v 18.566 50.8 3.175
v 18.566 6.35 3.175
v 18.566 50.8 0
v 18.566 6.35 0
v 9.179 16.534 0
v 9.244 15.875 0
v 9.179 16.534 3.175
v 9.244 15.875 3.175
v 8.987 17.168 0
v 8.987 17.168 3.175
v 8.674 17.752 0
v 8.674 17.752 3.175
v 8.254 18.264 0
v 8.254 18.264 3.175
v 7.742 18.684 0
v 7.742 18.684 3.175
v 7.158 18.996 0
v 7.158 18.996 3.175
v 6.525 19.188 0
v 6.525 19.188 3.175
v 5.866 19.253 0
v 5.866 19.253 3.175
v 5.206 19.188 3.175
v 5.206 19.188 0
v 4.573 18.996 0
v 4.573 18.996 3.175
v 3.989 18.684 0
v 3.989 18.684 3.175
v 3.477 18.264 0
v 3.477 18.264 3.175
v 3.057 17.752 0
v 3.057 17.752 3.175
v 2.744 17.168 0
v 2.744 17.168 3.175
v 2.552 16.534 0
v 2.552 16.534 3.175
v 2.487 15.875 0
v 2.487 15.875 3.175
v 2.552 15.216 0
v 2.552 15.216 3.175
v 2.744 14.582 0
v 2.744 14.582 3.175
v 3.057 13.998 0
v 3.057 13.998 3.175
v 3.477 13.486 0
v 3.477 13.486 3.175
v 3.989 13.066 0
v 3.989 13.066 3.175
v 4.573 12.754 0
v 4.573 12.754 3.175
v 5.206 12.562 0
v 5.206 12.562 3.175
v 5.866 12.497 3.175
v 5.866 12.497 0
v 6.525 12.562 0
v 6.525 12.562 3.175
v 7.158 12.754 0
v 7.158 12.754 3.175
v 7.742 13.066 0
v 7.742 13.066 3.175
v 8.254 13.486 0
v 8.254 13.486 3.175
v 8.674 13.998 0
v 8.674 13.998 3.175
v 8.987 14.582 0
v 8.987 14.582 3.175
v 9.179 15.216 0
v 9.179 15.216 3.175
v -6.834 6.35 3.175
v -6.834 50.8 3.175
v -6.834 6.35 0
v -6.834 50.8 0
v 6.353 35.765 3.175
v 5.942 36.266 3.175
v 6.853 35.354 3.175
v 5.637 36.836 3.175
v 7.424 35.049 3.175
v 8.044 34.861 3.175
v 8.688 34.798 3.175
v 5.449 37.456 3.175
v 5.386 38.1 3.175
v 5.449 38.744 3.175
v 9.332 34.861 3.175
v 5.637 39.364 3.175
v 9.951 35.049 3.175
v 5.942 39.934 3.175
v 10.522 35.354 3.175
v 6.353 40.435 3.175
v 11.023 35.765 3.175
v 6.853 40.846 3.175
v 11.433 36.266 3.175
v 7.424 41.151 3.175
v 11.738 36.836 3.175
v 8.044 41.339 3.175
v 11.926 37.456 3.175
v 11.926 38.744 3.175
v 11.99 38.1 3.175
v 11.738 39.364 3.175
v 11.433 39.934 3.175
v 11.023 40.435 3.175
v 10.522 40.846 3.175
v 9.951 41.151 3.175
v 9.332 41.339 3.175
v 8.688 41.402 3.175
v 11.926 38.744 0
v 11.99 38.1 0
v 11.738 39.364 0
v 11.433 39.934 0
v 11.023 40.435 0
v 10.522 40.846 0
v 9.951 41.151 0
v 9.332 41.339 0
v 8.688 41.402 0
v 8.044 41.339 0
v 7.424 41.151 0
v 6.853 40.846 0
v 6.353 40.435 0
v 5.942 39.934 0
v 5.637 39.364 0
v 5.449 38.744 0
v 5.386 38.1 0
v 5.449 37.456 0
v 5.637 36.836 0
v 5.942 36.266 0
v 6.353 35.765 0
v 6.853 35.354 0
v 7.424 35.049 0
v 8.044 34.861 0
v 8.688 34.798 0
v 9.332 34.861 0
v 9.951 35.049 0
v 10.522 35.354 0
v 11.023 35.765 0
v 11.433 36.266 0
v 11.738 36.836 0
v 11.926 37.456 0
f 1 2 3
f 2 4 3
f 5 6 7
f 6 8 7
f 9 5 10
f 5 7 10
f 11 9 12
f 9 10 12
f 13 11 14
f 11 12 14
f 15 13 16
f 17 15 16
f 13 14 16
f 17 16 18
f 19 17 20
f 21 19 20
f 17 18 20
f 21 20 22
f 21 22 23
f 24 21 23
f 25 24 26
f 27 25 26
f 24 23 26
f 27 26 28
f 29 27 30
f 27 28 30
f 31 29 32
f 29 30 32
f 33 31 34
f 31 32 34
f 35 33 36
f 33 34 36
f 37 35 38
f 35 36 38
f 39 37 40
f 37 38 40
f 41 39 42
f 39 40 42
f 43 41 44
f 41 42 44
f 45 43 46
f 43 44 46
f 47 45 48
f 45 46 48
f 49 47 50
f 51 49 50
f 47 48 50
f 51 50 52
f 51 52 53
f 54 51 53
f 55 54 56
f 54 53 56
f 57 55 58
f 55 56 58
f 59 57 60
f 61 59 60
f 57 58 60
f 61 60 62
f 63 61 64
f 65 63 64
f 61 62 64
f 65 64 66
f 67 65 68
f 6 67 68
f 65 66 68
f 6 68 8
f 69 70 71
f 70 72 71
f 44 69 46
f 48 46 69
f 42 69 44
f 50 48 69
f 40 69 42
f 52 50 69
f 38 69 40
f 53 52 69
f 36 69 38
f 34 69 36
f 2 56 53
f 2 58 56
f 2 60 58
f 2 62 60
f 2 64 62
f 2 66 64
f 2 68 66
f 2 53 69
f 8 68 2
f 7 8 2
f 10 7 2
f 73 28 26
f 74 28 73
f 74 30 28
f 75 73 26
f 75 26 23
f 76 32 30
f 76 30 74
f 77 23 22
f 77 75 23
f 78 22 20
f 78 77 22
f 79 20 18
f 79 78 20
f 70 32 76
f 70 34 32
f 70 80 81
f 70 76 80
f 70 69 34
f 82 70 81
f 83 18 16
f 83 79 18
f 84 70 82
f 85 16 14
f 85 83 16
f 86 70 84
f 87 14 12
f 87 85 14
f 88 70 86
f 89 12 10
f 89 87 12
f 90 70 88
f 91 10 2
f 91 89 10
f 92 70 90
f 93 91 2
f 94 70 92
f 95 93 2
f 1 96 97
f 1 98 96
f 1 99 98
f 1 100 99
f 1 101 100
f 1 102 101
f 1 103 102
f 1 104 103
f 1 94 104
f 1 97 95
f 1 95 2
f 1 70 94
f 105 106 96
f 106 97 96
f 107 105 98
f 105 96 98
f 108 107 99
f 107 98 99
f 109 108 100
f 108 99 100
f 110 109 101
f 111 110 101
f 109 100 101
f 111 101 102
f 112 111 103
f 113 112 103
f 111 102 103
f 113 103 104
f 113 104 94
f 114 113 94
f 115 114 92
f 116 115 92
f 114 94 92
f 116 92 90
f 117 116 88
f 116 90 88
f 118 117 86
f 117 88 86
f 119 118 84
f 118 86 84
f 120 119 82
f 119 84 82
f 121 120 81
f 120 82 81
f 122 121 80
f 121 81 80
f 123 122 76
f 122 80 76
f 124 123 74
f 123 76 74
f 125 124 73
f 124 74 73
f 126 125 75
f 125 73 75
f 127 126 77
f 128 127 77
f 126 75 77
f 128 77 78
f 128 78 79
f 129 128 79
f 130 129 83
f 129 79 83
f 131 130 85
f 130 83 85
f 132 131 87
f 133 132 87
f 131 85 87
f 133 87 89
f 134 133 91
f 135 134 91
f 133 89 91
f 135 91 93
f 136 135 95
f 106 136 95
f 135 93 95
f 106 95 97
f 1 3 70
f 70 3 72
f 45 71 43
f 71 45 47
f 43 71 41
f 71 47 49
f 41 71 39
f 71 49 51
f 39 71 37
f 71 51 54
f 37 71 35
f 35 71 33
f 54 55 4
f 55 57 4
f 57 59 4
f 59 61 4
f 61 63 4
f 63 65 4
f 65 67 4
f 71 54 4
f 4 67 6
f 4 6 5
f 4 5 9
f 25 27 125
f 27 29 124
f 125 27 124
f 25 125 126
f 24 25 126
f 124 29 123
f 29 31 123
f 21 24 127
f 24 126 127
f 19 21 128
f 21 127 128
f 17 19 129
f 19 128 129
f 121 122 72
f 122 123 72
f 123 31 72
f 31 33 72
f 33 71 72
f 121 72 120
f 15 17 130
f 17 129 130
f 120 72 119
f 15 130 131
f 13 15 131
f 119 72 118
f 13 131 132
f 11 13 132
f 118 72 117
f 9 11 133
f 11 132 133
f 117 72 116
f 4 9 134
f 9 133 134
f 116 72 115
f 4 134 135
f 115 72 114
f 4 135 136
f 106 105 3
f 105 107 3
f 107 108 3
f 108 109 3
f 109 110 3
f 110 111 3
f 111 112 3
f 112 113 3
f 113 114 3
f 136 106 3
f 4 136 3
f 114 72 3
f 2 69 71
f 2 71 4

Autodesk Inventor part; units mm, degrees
ref_plane "YZ Plane" through (0, 0, 0) normal (1, 0, 0) x (0, 1, 0)
ref_plane "XZ Plane" through (0, 0, 0) normal (0, 1, 0) x (-1, 0, 0)
ref_plane "XY Plane" through (0, 0, 0) normal (0, 0, 1) x (1, 0, 0)
sketch "Sketch1" plane through (0, 0, 0) normal (0, 0, 1) x (1, 0, 0)
  line L0 (0, 0) -> (-6.8345, 0)
  line L1 (-6.8345, 0) -> (18.5655, 0)
  line L2 (18.5655, 0) -> (18.5655, 50.8)
  line L3 (18.5655, 50.8) -> (-6.8345, 50.8)
  line L4 (-6.8345, 50.8) -> (-6.8345, 0)
  dimension "d0" = 25.4
  dimension "d1" = 50.8
extrude "Extrusion1" add sketch "Sketch1" along normal blind 3.175
sketch "Sketch2" plane through (0, 0, 3.175) normal (0, 0, 1) x (1, 0, 0)
  circle A0 centre (5.8655, 15.875) radius 3.3782 projected
  circle A1 centre (8.6877, 38.1) radius 3.302 projected
  point P0 (0, 0)
extrude "Extrusion2" cut sketch "Sketch2" against normal blind 25.4
sketch "Sketch3" plane through (0, 0, 3.175) normal (0, 0, 1) x (1, 0, 0)
  line L0 (-6.8345, 0) -> (18.5655, 0) projected
  line L1 (18.5655, 0) -> (18.5655, 50.8) projected
  line L2 (-6.8345, 50.8) -> (-6.8345, 0) projected
  line L3 (-6.8345, 0) -> (-6.8345, 6.35)
  line L4 (-6.8345, 6.35) -> (18.5655, 6.35)
  point P0 (0, 0)
  dimension "d6" = 6.35
extrude "Extrusion3" cut sketch "Sketch3" against normal blind 25.4
properties part number "winch mount back support"
